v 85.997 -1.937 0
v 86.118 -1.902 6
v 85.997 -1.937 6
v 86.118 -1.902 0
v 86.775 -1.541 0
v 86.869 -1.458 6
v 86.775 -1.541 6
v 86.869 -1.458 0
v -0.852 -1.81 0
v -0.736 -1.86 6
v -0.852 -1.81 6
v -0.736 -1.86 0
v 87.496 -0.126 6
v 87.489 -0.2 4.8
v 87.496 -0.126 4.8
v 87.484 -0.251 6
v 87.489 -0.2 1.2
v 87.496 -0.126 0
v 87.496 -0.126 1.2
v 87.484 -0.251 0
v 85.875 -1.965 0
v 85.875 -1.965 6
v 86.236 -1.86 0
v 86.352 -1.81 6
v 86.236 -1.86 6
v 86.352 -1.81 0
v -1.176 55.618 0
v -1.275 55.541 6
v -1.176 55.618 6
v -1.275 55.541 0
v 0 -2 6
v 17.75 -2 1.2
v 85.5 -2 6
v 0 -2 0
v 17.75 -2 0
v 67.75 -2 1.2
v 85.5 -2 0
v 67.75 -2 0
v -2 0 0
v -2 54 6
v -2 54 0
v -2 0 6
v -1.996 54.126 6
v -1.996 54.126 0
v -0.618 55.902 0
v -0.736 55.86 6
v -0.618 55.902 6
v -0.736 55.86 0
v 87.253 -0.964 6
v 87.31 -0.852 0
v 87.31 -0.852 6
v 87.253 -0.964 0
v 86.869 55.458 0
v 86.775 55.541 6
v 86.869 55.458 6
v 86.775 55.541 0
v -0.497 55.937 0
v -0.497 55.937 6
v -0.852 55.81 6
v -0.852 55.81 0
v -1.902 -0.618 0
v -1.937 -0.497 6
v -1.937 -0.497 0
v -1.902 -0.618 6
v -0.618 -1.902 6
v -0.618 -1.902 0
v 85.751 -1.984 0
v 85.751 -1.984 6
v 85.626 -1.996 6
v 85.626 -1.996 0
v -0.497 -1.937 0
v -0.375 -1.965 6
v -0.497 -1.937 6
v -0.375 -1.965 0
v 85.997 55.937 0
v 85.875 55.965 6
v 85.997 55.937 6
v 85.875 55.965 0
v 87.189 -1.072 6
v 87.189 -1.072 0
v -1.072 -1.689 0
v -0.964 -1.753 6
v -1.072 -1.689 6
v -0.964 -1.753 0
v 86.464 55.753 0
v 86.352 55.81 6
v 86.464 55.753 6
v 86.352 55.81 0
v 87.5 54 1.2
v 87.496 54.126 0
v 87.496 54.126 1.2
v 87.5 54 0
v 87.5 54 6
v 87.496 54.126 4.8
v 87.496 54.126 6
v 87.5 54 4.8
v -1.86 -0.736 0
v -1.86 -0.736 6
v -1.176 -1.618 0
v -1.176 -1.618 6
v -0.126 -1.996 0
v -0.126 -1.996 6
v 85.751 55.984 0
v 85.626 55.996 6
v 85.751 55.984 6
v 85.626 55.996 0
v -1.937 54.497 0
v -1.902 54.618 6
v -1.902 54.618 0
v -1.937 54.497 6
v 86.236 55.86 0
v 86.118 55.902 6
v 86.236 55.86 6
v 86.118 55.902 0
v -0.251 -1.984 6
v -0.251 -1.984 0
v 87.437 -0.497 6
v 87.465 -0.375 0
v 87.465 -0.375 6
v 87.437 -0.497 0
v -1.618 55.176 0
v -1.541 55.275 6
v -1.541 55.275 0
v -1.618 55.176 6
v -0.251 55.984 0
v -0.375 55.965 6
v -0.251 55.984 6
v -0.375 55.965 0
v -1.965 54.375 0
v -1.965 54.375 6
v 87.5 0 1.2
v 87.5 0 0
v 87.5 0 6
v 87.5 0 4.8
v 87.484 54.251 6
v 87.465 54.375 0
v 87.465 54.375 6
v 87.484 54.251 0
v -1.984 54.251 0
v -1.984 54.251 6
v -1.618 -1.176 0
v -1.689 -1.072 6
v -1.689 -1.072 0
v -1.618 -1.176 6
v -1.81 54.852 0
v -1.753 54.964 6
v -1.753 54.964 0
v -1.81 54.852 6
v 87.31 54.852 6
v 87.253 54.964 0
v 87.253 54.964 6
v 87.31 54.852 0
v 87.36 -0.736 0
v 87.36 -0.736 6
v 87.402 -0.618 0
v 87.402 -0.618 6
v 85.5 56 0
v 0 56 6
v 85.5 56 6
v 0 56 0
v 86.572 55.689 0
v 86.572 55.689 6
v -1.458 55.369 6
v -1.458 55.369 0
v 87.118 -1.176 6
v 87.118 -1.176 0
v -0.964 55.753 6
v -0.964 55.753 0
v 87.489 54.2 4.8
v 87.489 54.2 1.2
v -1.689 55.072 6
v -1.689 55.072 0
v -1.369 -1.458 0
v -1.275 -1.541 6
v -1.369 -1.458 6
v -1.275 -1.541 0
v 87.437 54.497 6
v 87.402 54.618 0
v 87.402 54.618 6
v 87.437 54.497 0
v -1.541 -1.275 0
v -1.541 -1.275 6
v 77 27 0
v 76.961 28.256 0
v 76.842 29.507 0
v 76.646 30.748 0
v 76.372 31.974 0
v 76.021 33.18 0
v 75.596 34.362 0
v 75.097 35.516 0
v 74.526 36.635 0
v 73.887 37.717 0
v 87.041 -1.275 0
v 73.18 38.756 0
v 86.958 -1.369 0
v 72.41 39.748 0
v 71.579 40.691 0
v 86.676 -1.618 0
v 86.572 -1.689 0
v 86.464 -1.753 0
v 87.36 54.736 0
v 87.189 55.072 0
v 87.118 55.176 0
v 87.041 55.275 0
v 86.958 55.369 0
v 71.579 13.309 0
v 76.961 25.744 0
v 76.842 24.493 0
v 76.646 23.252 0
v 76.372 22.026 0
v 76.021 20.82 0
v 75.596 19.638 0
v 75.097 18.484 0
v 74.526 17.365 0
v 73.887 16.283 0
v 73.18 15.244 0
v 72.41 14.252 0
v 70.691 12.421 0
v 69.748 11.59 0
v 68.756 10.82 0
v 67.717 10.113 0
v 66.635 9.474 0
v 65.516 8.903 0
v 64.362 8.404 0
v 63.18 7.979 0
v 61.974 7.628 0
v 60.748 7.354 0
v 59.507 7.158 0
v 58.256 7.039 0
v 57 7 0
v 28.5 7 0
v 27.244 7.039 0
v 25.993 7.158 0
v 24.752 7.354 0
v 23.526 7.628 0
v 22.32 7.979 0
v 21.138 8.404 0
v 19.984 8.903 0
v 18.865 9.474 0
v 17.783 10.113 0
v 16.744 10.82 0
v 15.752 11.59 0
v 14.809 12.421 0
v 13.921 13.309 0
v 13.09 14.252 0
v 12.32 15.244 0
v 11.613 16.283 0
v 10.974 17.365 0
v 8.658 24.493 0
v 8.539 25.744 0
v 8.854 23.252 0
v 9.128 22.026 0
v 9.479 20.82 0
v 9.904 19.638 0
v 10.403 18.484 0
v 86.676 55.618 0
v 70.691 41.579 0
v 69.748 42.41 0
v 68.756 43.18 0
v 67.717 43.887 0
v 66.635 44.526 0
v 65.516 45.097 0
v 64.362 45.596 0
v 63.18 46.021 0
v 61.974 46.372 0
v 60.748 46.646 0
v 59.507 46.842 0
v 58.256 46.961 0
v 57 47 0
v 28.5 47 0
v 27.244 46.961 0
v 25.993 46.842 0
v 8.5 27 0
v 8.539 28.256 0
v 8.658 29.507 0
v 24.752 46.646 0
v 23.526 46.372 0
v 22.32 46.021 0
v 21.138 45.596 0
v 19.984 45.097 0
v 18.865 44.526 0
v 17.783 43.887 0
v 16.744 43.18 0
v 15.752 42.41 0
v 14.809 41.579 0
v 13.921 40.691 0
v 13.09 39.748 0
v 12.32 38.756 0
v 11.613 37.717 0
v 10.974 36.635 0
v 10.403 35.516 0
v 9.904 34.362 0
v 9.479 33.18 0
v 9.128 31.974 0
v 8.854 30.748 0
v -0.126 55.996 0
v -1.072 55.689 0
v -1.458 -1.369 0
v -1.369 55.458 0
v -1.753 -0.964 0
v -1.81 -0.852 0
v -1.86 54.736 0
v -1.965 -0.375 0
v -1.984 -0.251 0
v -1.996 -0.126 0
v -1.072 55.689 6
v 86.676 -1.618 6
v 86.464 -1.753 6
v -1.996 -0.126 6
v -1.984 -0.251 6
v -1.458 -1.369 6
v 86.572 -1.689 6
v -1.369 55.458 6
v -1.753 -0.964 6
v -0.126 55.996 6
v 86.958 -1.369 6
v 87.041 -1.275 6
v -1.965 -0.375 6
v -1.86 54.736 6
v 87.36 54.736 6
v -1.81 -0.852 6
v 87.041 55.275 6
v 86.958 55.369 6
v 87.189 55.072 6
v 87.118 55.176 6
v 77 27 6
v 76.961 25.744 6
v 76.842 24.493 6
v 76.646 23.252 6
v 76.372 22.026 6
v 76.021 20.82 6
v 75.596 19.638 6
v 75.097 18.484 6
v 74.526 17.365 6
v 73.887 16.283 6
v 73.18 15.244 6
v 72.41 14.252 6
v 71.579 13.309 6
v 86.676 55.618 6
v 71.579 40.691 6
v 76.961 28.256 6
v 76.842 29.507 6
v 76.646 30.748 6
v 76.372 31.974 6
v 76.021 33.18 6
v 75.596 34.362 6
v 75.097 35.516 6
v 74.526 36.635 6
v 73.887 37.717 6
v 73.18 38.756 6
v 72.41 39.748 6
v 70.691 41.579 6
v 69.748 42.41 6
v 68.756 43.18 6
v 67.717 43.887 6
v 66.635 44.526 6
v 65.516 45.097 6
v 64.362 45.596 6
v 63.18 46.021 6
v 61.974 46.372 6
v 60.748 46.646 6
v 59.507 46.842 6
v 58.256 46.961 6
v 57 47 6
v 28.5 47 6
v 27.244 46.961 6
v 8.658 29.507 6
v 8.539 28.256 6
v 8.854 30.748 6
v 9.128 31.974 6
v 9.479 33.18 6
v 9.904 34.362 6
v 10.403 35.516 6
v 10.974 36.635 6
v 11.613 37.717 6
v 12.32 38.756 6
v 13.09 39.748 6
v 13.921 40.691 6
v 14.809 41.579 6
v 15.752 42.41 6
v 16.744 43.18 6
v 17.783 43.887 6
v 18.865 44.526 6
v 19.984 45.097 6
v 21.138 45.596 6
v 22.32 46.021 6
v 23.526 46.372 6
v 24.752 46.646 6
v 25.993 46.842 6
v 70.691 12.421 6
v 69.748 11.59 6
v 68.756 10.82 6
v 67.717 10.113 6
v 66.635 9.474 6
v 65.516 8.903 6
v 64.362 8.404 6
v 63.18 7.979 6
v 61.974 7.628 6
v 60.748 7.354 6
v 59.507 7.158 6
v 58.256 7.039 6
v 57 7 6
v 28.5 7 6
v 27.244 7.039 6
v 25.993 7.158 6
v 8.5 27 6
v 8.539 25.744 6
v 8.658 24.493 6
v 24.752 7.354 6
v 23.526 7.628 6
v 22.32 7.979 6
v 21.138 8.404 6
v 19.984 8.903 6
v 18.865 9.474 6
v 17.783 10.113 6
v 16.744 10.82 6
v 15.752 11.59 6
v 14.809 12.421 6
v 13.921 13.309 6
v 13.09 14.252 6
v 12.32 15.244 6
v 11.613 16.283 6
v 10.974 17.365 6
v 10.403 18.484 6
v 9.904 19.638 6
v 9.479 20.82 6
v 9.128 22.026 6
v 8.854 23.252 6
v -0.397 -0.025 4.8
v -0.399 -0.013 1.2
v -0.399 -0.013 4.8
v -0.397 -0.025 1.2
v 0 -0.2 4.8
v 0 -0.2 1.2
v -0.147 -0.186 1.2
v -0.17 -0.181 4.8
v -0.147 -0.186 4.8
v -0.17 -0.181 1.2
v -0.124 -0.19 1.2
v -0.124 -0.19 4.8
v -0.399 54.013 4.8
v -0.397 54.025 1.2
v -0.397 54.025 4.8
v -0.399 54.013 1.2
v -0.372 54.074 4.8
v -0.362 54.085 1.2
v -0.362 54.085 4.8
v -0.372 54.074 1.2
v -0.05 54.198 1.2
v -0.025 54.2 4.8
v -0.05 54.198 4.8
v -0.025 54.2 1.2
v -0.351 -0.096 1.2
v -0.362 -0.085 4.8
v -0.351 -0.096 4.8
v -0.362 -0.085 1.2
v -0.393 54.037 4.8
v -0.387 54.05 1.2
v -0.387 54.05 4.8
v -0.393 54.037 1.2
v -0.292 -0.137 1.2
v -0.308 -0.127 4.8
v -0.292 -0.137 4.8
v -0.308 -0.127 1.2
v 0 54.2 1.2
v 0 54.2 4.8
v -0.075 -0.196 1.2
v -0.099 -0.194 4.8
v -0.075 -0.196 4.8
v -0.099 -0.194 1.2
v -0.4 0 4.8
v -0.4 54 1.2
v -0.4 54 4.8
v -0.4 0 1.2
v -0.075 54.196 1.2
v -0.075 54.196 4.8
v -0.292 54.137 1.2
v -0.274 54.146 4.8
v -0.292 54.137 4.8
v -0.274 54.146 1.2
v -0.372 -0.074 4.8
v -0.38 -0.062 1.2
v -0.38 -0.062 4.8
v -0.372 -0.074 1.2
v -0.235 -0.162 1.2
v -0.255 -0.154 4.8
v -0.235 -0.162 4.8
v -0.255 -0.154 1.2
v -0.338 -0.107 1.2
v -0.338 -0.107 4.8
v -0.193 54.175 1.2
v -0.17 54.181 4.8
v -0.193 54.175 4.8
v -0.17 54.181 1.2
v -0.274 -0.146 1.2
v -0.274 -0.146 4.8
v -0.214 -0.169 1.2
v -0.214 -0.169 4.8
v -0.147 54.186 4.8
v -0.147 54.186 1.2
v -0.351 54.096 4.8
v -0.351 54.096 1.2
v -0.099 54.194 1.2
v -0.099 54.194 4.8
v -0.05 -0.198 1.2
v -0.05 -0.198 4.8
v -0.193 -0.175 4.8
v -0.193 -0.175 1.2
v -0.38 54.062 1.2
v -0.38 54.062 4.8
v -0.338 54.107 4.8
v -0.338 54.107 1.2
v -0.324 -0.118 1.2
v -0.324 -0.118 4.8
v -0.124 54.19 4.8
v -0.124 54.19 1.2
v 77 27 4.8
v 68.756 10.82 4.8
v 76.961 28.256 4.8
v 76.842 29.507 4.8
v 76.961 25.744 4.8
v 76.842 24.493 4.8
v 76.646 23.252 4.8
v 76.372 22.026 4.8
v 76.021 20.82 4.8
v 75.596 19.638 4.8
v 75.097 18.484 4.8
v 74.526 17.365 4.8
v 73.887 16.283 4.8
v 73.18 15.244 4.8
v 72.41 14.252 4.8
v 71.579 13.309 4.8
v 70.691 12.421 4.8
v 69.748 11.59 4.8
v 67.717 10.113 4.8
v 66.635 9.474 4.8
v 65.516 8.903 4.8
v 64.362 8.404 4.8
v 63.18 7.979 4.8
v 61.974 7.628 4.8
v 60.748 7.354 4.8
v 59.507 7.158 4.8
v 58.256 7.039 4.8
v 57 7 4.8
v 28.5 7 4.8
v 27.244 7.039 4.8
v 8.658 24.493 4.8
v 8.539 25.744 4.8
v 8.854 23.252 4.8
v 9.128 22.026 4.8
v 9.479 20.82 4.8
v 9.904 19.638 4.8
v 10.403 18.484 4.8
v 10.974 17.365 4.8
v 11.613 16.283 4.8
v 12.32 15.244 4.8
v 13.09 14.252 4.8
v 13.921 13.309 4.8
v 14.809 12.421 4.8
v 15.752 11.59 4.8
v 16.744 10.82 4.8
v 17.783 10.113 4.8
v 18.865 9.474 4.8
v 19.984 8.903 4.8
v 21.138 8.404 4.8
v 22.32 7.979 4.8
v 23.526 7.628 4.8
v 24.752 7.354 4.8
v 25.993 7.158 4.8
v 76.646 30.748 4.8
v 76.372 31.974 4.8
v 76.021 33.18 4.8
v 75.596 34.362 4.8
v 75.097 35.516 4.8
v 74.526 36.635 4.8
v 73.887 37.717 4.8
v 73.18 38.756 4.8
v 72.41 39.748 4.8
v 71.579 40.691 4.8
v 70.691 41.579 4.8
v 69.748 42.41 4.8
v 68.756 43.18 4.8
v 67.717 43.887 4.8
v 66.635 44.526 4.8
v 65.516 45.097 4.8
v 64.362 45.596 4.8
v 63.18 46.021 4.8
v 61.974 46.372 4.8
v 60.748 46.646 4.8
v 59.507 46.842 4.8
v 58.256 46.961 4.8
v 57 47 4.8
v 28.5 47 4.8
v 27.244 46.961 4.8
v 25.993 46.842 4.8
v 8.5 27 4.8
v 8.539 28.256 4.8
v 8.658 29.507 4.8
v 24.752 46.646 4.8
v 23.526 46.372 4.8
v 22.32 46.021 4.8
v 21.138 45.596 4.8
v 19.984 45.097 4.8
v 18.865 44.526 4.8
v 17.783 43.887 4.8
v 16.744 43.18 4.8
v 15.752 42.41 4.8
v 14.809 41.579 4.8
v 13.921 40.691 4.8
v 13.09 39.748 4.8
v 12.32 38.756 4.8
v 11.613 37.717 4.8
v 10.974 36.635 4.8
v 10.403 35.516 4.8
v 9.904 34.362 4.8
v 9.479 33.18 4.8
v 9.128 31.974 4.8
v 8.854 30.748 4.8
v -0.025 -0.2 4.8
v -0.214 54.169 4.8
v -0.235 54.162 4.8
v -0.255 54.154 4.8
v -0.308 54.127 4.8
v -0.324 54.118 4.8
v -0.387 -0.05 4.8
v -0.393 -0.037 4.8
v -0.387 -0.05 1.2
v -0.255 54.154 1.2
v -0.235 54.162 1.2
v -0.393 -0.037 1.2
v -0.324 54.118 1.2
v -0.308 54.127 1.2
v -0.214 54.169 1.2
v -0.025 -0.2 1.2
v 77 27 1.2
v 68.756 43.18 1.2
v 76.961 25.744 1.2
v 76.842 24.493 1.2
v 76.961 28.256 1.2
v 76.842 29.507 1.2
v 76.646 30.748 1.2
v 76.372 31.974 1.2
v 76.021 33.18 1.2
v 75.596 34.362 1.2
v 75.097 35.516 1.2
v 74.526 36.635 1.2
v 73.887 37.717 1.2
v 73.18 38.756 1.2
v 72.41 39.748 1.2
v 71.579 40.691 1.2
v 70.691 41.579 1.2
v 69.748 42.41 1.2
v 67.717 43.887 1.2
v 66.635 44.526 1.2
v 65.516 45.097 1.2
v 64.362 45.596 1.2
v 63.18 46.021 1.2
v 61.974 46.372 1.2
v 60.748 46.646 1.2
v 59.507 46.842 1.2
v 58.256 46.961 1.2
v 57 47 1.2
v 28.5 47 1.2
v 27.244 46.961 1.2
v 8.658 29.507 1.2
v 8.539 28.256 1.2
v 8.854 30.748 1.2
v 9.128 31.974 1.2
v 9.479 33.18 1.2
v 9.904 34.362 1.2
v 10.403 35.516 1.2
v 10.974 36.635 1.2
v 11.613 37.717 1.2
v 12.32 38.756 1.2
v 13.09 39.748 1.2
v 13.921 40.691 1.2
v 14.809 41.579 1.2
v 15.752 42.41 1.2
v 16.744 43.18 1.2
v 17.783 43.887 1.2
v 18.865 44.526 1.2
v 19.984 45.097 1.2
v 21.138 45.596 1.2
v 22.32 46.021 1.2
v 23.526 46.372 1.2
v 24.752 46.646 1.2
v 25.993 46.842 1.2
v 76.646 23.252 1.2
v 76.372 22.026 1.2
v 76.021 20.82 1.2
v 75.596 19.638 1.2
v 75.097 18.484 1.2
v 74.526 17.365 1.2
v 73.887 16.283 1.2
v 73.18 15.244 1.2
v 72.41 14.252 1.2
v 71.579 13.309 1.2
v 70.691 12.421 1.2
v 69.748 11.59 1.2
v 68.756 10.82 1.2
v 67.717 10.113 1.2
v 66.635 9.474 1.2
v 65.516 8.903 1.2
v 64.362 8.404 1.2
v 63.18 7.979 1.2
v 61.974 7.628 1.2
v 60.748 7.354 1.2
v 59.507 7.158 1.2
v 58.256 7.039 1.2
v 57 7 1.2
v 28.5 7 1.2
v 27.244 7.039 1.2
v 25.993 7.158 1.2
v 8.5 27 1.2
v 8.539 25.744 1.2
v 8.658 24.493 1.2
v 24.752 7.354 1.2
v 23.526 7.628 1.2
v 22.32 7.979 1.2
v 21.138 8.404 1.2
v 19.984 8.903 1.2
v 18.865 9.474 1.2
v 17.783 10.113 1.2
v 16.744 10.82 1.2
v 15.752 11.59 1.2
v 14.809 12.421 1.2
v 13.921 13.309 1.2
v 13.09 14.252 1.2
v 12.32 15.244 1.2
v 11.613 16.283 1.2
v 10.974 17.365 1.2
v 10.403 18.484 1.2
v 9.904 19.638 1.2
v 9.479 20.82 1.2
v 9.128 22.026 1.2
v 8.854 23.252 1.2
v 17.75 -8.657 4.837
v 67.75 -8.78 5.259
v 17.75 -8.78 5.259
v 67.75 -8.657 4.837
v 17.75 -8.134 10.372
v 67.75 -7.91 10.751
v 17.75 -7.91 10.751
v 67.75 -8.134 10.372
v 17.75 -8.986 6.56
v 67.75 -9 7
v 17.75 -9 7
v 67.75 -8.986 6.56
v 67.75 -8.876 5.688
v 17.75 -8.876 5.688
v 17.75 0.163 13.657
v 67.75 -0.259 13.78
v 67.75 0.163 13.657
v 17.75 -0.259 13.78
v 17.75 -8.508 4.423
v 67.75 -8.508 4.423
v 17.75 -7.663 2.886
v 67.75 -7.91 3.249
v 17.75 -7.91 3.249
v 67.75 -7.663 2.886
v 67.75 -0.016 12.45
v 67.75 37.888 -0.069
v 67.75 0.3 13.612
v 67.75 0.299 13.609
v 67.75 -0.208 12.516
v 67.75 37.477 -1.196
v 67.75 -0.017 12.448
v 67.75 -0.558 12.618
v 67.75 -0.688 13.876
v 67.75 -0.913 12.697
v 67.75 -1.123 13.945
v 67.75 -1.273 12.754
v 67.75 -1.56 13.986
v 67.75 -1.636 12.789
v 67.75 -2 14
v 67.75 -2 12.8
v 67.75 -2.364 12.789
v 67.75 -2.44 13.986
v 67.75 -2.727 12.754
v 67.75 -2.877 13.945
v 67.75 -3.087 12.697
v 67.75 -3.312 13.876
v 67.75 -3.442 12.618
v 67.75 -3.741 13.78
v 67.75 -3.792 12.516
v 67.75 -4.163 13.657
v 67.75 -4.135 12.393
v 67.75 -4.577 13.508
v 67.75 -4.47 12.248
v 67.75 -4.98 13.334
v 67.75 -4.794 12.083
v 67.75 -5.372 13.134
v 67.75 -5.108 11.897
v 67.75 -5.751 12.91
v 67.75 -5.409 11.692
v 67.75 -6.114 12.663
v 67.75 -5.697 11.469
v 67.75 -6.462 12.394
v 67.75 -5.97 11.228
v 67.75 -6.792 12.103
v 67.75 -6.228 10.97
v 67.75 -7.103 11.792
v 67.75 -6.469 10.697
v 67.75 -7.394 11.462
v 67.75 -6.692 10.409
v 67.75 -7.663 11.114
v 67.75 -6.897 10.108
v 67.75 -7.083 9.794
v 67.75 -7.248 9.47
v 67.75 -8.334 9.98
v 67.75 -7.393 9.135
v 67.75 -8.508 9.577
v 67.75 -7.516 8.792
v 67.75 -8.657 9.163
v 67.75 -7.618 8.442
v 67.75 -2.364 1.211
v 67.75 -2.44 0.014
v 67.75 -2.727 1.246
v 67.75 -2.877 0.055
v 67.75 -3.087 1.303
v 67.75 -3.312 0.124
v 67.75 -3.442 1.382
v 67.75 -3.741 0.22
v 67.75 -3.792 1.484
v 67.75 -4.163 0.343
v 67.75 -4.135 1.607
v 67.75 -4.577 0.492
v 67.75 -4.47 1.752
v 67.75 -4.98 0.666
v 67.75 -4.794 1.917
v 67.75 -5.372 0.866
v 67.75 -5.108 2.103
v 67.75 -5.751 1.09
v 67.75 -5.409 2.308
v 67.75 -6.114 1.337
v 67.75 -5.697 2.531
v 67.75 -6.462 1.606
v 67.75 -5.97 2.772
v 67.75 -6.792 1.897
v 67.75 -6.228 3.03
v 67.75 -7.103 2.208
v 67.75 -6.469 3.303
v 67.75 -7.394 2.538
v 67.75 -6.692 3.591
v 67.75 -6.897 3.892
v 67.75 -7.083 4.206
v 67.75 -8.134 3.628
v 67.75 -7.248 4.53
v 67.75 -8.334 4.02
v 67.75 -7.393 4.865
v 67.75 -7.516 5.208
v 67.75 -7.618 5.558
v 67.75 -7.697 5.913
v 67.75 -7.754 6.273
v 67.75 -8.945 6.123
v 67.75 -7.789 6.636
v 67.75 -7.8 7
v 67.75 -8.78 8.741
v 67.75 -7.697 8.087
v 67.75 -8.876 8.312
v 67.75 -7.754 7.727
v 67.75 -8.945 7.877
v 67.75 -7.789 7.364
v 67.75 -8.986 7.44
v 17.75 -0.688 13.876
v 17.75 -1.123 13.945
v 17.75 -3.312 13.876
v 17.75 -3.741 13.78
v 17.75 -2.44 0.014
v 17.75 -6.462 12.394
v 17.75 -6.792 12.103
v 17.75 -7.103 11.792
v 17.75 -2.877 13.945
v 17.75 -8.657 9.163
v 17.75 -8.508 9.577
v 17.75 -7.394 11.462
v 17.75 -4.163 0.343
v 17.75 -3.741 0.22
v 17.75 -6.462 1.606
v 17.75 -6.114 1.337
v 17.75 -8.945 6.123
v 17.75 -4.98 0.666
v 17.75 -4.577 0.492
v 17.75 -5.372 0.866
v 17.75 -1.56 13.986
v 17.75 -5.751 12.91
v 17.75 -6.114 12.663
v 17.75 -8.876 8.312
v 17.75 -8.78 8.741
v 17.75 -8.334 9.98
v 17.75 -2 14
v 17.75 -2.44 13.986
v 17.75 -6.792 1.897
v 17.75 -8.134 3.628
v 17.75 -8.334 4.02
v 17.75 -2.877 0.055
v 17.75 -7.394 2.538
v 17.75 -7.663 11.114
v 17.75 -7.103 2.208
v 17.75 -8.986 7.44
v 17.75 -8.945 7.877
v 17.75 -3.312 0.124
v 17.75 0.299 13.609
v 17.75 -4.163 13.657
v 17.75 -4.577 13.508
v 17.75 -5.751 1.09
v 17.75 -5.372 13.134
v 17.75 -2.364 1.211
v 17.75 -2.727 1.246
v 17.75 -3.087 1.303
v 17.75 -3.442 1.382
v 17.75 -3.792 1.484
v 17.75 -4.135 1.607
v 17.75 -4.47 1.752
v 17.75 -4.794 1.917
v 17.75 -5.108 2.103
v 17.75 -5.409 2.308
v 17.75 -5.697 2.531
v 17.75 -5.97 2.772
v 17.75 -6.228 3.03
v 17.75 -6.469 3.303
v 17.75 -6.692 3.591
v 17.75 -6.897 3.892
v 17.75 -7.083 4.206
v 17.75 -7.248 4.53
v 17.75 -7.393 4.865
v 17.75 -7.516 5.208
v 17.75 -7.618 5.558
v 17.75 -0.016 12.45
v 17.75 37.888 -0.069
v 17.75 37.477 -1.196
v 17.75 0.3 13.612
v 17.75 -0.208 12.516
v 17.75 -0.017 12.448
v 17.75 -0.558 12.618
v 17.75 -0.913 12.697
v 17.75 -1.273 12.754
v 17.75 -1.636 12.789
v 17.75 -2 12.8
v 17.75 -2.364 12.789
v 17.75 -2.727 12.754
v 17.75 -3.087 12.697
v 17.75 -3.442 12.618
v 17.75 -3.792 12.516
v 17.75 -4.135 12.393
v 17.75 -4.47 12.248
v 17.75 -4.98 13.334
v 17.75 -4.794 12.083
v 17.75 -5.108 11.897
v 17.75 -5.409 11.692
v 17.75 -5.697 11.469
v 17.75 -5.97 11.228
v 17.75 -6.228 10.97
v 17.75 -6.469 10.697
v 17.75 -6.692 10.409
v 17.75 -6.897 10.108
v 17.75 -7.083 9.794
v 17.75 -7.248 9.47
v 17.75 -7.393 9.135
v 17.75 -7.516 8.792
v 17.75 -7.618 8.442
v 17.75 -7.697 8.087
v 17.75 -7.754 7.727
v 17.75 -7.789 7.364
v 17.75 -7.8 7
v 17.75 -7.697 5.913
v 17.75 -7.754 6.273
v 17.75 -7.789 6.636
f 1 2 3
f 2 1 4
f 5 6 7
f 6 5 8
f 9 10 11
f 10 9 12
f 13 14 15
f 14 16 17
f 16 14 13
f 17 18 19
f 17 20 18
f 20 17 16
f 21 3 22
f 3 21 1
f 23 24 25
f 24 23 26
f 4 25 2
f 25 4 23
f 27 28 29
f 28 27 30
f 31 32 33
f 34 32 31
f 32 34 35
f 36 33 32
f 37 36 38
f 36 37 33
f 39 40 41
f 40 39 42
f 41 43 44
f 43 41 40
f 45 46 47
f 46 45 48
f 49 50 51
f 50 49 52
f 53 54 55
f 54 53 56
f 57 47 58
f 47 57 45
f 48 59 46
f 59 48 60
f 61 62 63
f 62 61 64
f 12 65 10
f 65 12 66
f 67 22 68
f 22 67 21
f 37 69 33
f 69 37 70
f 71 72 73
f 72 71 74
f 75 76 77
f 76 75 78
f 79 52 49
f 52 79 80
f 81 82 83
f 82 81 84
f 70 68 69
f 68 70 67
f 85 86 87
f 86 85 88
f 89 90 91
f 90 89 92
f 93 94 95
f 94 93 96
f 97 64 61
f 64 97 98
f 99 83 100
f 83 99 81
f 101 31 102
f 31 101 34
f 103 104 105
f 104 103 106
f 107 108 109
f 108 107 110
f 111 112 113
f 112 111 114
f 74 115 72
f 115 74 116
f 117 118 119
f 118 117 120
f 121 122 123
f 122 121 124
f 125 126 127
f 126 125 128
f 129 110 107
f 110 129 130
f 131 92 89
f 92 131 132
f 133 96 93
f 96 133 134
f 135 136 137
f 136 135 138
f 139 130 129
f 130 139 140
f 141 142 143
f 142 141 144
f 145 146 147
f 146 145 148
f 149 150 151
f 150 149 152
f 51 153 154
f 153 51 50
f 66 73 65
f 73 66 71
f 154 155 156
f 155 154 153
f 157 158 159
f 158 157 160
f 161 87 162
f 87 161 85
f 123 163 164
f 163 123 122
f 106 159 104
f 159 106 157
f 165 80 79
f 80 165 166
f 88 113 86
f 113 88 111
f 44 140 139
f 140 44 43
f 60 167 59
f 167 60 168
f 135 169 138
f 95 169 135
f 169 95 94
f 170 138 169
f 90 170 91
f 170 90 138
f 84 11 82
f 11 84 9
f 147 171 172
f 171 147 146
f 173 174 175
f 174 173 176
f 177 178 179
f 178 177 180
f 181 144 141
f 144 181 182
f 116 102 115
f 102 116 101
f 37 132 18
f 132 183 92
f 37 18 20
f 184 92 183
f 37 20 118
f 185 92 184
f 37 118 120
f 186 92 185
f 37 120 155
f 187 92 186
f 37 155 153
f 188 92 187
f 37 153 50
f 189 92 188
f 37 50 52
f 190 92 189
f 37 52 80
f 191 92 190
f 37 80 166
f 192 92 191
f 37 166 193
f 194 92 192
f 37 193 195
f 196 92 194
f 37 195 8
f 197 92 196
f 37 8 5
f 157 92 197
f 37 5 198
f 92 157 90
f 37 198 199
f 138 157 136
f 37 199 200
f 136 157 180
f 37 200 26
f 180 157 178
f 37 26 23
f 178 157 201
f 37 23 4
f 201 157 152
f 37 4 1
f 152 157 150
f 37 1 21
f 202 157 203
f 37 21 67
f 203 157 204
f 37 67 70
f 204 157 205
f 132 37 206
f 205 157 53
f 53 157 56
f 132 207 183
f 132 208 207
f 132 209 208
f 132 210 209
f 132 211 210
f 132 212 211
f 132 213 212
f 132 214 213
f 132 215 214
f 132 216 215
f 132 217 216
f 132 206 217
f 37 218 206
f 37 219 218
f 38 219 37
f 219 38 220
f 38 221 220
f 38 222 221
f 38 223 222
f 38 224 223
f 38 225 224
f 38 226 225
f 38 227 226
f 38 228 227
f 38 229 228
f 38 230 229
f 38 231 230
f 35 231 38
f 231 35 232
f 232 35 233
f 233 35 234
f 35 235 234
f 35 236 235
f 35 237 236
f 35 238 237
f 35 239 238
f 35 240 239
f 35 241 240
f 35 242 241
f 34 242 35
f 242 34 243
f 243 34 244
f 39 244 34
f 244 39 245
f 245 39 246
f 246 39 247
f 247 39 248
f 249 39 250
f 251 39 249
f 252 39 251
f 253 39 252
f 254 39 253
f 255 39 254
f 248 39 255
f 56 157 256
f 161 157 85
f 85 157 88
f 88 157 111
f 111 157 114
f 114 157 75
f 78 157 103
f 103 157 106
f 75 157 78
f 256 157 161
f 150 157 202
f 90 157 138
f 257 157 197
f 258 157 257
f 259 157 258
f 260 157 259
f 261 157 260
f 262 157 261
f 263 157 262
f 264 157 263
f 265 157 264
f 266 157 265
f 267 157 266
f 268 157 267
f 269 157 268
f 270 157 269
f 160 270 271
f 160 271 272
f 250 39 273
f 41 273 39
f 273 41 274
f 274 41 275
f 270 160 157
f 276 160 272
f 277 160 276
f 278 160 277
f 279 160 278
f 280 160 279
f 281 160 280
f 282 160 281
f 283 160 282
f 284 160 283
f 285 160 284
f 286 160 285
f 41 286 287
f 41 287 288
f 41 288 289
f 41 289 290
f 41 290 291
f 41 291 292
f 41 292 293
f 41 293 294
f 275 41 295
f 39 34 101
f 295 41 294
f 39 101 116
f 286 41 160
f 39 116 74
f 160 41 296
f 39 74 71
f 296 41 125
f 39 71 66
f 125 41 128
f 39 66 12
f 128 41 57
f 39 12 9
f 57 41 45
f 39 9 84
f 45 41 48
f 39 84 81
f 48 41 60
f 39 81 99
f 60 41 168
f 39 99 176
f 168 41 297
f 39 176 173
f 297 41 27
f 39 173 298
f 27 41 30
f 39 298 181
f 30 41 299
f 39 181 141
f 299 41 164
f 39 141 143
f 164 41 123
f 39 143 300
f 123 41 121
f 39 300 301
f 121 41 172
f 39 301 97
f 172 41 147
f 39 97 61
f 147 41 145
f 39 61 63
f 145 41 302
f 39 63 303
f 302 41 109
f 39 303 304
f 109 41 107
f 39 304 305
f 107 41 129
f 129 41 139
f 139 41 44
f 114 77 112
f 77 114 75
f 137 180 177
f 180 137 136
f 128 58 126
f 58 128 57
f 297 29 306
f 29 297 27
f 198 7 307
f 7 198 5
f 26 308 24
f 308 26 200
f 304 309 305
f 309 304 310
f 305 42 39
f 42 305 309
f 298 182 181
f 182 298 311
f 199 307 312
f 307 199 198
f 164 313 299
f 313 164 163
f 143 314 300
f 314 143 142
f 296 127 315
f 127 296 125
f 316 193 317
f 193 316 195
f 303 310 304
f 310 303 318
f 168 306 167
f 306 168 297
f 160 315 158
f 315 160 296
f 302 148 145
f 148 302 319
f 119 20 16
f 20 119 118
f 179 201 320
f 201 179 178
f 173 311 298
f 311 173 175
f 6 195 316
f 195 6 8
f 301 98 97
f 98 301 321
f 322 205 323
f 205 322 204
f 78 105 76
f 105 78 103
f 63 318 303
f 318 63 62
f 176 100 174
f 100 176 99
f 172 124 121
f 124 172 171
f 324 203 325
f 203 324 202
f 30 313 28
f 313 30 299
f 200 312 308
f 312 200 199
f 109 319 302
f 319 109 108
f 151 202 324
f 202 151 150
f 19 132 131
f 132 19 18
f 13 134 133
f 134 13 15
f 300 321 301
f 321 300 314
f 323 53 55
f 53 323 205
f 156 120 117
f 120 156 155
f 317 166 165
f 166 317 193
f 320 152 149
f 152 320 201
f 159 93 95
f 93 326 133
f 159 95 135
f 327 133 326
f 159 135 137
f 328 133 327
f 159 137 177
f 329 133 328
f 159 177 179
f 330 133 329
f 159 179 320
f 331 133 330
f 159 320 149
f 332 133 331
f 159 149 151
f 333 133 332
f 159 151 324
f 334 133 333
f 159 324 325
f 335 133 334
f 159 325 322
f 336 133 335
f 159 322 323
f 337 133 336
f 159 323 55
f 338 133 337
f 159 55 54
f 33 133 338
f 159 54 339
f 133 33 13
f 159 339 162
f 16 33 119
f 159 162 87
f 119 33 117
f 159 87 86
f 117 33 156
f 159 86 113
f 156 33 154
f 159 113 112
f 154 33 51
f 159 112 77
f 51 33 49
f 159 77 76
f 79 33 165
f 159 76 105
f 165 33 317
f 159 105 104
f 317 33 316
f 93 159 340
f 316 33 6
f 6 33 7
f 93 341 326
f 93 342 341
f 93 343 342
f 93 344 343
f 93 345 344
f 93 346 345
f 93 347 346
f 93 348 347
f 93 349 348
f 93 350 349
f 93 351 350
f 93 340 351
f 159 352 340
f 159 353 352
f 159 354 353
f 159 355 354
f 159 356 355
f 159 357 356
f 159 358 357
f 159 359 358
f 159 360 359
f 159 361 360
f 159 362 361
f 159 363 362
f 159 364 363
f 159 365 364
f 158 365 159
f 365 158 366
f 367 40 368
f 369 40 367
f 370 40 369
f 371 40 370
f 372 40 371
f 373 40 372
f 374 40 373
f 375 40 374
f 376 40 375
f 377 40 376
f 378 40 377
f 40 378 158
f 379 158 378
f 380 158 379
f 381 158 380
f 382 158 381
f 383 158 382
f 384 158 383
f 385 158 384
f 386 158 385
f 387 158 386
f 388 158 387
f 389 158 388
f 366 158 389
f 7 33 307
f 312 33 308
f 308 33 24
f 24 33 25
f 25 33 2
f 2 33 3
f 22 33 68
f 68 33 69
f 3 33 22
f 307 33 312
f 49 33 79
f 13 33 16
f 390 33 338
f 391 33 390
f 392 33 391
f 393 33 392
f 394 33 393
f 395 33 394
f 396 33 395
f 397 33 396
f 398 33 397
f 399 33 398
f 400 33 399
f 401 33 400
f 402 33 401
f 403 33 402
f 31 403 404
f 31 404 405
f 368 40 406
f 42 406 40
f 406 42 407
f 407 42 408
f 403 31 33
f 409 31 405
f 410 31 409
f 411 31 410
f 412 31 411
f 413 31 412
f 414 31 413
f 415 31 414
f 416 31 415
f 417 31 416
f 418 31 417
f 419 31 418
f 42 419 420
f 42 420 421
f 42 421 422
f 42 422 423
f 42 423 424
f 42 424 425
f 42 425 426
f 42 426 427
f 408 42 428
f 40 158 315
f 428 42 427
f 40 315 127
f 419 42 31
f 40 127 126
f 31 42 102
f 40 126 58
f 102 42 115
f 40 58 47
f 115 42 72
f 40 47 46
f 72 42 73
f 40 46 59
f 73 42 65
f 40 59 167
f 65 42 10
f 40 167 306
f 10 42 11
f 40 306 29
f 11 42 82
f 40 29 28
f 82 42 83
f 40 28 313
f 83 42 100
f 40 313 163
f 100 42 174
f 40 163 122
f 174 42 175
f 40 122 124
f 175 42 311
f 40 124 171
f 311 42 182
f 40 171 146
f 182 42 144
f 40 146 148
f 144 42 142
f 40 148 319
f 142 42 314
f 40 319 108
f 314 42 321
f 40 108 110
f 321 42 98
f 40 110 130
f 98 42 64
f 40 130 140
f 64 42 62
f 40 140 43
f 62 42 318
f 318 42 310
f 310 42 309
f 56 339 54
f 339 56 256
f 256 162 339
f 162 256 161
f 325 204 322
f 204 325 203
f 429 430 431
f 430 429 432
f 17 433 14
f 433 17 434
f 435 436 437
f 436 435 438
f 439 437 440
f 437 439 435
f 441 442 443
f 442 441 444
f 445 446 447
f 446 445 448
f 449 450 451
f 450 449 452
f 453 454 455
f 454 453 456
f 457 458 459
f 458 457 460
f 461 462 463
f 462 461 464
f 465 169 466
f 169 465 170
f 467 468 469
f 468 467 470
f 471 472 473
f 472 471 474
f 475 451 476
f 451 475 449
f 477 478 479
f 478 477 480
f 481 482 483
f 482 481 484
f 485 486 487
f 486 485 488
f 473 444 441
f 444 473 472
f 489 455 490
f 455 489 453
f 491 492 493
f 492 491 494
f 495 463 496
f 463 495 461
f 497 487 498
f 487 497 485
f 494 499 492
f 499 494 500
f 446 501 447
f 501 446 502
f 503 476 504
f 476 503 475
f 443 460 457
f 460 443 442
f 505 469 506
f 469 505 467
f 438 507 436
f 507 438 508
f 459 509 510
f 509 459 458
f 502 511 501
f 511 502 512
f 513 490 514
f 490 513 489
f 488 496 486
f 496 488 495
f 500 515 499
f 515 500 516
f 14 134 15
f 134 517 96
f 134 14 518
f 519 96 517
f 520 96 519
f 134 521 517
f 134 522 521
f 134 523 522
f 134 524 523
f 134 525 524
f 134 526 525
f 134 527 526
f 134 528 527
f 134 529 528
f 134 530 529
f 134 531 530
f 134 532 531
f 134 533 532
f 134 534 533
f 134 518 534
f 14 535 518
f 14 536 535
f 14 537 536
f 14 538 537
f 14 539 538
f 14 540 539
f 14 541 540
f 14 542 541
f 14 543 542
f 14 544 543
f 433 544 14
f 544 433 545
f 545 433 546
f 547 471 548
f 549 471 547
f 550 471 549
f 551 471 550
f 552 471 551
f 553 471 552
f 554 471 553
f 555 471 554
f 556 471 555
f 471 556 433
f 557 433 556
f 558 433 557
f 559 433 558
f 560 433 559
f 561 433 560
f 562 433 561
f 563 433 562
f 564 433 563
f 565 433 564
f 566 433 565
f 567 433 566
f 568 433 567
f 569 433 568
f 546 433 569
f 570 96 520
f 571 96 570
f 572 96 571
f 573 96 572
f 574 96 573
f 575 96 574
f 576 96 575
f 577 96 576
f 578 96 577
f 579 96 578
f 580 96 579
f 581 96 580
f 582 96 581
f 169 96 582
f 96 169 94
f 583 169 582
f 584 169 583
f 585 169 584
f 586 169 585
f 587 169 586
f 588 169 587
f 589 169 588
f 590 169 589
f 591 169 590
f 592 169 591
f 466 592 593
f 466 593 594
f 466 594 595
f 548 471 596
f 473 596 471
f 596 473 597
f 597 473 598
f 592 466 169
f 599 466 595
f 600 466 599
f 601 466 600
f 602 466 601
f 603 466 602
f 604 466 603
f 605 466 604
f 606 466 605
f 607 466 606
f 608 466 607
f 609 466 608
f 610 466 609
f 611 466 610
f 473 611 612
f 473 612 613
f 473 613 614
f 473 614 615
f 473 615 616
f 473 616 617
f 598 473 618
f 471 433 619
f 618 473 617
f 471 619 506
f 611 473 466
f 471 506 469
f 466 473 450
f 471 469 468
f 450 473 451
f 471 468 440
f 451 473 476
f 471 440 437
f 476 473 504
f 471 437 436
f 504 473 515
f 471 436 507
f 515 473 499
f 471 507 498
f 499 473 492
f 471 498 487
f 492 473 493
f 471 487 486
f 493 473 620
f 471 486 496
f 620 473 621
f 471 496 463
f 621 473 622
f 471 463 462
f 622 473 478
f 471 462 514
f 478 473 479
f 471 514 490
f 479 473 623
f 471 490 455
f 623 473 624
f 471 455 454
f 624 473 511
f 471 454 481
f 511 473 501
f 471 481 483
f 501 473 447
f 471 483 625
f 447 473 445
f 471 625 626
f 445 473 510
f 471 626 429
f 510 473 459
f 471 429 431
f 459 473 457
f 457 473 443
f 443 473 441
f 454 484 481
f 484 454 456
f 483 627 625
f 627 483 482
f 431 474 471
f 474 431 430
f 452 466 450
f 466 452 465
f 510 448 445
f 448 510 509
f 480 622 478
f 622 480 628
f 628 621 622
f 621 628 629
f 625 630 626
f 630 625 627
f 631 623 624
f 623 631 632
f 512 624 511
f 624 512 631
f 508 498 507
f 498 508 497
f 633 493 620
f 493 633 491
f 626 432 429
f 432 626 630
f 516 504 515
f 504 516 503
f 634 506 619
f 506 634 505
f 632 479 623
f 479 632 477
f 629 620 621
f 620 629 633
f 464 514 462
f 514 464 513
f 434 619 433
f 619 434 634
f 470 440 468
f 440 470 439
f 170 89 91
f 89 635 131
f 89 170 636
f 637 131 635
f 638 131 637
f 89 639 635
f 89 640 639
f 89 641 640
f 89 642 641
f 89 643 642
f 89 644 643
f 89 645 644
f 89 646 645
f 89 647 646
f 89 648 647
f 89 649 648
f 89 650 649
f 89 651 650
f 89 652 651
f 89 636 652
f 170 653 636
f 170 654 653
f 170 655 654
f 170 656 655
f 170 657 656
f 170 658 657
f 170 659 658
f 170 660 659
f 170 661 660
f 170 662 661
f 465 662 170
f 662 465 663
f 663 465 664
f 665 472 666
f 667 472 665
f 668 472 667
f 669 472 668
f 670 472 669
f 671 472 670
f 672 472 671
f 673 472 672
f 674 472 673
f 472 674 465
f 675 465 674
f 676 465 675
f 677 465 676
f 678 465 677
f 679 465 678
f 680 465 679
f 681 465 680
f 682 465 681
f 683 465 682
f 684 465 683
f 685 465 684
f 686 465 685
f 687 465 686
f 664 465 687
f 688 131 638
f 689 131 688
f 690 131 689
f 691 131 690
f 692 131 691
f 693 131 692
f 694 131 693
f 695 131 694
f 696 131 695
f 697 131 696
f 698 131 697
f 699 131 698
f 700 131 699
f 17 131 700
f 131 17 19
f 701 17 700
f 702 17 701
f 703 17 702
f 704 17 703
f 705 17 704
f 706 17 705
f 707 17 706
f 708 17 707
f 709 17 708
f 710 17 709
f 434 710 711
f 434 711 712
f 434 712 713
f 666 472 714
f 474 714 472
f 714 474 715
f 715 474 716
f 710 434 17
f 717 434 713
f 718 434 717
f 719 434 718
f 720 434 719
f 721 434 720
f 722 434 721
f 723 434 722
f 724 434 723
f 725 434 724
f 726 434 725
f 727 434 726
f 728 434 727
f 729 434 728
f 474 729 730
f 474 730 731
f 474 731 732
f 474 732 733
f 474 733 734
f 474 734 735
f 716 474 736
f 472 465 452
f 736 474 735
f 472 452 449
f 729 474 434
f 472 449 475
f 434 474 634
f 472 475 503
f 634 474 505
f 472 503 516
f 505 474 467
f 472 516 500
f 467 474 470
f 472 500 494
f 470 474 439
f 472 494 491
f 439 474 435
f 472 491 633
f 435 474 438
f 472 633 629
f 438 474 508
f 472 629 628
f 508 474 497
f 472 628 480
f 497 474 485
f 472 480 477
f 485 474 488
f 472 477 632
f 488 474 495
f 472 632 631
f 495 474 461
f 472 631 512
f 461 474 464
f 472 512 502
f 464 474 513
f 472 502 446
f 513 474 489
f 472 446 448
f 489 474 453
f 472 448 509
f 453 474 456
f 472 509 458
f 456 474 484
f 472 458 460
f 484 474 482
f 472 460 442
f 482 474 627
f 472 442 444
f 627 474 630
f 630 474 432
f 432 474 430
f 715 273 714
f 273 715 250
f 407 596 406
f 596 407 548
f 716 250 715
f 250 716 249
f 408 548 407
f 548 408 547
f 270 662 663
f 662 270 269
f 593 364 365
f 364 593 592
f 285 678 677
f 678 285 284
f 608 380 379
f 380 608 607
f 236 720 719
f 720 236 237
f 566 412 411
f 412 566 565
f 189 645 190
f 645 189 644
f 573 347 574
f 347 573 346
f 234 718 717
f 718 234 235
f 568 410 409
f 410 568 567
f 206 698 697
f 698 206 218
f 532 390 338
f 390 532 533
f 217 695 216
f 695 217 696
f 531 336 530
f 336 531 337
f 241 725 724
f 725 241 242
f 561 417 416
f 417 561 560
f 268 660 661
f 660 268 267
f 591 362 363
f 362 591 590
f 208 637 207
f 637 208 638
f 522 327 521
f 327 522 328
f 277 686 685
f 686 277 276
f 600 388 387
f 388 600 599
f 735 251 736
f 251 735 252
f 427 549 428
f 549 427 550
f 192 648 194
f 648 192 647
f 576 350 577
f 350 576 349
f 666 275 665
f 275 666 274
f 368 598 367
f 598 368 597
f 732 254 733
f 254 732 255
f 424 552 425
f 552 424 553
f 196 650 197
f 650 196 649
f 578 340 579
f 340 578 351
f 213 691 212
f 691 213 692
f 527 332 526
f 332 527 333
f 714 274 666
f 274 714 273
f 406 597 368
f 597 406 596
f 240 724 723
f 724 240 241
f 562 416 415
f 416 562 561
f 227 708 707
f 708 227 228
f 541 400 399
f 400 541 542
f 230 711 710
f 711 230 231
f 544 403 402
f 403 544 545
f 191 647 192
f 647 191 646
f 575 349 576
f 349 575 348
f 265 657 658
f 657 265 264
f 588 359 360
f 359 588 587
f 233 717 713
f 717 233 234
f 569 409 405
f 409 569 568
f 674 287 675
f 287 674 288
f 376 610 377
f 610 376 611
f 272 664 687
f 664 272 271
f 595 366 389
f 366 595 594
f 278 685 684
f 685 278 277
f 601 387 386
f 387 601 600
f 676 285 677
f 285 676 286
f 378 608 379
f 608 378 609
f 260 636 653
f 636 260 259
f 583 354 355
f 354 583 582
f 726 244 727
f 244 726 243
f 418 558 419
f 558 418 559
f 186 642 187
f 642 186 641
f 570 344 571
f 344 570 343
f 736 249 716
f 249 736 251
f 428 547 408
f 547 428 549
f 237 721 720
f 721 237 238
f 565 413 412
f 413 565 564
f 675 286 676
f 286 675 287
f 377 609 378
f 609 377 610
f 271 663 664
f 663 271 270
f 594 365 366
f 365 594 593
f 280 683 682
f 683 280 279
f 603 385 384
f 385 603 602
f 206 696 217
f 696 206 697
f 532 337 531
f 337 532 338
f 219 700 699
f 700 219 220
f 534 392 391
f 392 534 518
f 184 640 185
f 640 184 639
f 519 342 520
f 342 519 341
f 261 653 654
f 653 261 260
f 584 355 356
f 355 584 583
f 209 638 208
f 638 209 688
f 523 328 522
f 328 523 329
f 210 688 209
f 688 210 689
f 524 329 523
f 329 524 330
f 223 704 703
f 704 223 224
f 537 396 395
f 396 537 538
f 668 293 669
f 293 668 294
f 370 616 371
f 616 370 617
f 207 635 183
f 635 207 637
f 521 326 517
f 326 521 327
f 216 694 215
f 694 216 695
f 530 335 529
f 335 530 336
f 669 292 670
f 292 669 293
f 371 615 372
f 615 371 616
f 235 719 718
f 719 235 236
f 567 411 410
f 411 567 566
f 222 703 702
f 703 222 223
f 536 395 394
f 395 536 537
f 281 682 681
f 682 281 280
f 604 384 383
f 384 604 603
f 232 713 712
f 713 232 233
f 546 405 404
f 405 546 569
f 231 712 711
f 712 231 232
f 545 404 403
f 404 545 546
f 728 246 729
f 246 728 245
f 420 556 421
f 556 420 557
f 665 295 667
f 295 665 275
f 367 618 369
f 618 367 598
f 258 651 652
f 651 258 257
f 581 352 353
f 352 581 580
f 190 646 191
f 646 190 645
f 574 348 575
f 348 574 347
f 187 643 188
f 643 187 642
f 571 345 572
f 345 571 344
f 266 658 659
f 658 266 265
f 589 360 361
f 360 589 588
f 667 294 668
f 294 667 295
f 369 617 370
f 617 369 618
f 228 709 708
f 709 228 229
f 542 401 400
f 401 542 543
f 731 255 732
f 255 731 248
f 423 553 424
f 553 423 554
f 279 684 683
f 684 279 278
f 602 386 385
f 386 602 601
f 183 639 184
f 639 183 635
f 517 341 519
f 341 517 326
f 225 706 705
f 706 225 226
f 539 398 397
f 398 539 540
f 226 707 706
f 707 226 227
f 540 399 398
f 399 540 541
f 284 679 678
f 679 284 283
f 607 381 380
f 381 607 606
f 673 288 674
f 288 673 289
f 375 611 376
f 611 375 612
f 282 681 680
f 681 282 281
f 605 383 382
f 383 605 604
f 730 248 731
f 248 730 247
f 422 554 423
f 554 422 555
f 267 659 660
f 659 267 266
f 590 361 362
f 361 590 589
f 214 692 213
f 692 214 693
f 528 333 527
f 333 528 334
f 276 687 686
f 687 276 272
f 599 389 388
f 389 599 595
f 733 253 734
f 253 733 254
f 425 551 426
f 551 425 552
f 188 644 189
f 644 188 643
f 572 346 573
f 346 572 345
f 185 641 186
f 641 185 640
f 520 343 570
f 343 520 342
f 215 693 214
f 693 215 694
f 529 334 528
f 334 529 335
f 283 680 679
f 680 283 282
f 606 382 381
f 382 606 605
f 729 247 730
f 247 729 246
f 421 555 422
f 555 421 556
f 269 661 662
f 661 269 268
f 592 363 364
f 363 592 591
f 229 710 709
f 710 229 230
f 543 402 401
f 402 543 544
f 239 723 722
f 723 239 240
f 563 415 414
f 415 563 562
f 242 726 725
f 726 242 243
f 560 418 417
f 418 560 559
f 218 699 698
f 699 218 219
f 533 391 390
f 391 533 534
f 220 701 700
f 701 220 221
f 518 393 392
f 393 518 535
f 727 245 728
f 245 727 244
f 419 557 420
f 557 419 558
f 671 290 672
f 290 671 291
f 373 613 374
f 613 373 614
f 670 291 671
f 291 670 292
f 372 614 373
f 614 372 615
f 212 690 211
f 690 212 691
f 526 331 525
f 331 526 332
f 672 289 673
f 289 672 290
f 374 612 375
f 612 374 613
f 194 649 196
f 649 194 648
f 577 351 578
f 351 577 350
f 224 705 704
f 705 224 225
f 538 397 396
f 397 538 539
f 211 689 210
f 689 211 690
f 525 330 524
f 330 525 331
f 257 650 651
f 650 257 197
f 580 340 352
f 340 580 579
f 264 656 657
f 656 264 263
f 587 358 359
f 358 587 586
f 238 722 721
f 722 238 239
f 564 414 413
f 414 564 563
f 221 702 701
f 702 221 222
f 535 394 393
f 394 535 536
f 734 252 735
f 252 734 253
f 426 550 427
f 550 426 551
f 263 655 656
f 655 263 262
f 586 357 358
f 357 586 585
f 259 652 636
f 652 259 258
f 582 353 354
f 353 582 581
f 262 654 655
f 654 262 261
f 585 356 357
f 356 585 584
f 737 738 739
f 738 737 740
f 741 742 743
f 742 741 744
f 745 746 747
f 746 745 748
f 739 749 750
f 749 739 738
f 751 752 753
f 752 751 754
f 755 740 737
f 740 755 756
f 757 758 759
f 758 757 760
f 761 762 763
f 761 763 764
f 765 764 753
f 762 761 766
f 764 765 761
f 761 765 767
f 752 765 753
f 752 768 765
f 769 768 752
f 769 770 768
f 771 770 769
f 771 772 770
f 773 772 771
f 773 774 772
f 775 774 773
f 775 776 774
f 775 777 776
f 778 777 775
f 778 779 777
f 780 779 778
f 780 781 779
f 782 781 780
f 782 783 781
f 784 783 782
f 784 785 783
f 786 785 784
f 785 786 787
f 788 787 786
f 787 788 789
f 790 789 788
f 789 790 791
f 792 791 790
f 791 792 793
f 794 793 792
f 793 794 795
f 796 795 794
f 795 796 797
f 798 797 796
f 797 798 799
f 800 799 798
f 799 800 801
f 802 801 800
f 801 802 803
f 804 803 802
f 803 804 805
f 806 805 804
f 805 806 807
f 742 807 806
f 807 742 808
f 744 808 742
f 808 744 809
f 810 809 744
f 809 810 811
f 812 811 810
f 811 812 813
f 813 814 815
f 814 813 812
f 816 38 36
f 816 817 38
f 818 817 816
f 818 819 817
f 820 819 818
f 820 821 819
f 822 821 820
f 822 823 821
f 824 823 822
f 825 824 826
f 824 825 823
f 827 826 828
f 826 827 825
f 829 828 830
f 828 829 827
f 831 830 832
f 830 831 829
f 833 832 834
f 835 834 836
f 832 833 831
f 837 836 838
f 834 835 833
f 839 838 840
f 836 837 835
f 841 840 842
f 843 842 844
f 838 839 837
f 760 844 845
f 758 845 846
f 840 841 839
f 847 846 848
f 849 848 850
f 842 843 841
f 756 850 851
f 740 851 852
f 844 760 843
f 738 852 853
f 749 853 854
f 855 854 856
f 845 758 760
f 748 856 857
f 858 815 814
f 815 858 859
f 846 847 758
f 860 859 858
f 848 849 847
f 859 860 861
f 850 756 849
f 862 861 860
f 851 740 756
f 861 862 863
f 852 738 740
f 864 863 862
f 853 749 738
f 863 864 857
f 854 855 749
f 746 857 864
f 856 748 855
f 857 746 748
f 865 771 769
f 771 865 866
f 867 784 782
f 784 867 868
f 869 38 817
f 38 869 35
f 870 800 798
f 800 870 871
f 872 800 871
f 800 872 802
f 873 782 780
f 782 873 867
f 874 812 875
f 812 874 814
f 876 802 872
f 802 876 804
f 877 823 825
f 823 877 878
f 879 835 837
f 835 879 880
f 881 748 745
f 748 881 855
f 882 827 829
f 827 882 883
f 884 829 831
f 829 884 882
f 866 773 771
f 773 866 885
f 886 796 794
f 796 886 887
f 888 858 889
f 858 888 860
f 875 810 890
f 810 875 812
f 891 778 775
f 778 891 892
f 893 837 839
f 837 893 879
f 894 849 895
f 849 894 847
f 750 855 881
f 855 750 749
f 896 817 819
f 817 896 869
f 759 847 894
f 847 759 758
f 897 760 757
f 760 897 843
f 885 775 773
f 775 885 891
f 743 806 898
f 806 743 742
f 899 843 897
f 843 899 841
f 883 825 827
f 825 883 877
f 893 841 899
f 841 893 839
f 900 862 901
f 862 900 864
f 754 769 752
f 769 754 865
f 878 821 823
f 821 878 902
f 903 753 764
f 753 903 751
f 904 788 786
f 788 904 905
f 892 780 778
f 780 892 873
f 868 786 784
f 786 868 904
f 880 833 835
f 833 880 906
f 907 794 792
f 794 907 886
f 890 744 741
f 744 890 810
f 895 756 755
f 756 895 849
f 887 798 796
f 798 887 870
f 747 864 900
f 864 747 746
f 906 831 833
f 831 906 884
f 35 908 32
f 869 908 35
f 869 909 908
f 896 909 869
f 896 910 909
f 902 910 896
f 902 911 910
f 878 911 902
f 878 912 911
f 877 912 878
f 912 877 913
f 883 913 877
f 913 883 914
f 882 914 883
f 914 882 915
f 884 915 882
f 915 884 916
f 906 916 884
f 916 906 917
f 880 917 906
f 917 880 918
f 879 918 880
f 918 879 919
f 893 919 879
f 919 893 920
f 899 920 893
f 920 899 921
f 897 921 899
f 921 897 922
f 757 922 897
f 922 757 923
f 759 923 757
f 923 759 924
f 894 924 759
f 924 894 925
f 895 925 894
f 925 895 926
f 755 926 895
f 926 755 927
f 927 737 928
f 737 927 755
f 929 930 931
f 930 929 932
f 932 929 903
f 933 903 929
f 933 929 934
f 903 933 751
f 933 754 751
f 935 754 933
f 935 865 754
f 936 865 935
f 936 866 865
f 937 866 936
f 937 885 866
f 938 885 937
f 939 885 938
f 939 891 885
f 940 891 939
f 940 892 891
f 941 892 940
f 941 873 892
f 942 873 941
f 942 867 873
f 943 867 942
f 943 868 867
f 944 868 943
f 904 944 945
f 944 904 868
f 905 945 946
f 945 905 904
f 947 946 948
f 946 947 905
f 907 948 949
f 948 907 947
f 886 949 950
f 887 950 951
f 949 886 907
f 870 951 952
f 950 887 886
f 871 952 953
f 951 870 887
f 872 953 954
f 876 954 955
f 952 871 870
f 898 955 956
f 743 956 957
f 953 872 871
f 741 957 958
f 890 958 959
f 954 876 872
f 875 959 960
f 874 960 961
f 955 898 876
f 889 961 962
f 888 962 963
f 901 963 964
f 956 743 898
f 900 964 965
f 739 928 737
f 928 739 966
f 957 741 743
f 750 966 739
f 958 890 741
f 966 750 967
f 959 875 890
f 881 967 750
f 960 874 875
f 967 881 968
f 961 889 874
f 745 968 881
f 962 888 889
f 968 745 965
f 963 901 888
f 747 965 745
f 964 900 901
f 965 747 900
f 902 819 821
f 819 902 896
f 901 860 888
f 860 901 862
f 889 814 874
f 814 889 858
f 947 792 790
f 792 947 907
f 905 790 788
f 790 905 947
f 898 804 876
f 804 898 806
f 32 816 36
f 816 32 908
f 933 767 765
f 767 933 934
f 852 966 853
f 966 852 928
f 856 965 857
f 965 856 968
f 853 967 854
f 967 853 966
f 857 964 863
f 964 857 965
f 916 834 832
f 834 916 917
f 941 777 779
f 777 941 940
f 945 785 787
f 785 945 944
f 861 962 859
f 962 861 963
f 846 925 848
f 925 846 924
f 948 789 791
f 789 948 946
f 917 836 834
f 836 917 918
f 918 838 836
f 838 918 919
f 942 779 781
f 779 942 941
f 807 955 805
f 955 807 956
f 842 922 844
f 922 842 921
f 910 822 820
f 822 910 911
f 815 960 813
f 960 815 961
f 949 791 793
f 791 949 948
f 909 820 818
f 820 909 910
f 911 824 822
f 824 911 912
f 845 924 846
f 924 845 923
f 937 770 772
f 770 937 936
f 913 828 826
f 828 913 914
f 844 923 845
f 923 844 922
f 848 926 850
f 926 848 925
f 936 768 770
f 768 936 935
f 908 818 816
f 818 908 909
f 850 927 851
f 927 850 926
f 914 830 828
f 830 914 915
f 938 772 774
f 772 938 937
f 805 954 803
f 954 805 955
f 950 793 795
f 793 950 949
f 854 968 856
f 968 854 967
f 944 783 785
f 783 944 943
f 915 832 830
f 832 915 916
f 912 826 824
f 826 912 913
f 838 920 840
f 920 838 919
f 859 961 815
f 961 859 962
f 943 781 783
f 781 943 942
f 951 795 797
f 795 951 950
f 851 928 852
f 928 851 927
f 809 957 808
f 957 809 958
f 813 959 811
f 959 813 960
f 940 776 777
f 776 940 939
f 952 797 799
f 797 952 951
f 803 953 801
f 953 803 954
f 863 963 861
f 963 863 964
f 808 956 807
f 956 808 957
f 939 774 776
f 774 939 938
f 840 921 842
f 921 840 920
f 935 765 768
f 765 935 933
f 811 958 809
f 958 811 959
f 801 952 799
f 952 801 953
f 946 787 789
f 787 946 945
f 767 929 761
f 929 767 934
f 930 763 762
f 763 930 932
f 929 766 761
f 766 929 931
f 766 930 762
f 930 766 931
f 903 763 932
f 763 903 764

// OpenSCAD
card_size = [85.5,54];
card_thick = 0.8*4;
offset = 0.2;
wallet_boarder = 2;
wallet_thick = 1.2;
clip_width = 50;
clip_lenght = 40;

clip_r = 7;
clip_angle = 20;

push_hole_size = 20;

$fn = 100;


difference(){
#linear_extrude(wallet_thick*2 + card_thick + offset*2)
offset(wallet_boarder)
square(card_size);

translate([0,0,wallet_thick])    
linear_extrude(card_thick + offset*2)
scale([2,1,1])
offset(offset)
square(card_size);

linear_extrude(wallet_thick*2 + card_thick + offset*2 + 2)
hull(){
translate([card_size[0]/3,card_size[1]/2,0])
circle(push_hole_size);

translate([card_size[0]*2/3,card_size[1]/2,0])
circle(push_hole_size);
}  
}

translate([0,-wallet_boarder,clip_r])
difference(){
    translate([(card_size[0]-clip_width)/2,0,0])
    rotate([0,90,0])
    cylinder(h=clip_width, r=clip_r);
    
    translate([(card_size[0]-clip_width)/2,0,0])
    rotate([0,90,0])
    cylinder(h=clip_width, r=clip_r-wallet_thick);
    
    #
    rotate([-clip_angle,0,0])
    cube([card_size[0], card_size[1], clip_r*2]);
    
    rotate([-90,0,0])
    cube([card_size[0], card_size[1], clip_r*2]);
}

translate([0,-wallet_boarder,clip_r])
translate([(card_size[0]-clip_width)/2,0,0])
rotate([-clip_angle,0,0])
translate([0,-0.1,clip_r-wallet_thick])
cube([clip_width, clip_lenght,wallet_thick]);
